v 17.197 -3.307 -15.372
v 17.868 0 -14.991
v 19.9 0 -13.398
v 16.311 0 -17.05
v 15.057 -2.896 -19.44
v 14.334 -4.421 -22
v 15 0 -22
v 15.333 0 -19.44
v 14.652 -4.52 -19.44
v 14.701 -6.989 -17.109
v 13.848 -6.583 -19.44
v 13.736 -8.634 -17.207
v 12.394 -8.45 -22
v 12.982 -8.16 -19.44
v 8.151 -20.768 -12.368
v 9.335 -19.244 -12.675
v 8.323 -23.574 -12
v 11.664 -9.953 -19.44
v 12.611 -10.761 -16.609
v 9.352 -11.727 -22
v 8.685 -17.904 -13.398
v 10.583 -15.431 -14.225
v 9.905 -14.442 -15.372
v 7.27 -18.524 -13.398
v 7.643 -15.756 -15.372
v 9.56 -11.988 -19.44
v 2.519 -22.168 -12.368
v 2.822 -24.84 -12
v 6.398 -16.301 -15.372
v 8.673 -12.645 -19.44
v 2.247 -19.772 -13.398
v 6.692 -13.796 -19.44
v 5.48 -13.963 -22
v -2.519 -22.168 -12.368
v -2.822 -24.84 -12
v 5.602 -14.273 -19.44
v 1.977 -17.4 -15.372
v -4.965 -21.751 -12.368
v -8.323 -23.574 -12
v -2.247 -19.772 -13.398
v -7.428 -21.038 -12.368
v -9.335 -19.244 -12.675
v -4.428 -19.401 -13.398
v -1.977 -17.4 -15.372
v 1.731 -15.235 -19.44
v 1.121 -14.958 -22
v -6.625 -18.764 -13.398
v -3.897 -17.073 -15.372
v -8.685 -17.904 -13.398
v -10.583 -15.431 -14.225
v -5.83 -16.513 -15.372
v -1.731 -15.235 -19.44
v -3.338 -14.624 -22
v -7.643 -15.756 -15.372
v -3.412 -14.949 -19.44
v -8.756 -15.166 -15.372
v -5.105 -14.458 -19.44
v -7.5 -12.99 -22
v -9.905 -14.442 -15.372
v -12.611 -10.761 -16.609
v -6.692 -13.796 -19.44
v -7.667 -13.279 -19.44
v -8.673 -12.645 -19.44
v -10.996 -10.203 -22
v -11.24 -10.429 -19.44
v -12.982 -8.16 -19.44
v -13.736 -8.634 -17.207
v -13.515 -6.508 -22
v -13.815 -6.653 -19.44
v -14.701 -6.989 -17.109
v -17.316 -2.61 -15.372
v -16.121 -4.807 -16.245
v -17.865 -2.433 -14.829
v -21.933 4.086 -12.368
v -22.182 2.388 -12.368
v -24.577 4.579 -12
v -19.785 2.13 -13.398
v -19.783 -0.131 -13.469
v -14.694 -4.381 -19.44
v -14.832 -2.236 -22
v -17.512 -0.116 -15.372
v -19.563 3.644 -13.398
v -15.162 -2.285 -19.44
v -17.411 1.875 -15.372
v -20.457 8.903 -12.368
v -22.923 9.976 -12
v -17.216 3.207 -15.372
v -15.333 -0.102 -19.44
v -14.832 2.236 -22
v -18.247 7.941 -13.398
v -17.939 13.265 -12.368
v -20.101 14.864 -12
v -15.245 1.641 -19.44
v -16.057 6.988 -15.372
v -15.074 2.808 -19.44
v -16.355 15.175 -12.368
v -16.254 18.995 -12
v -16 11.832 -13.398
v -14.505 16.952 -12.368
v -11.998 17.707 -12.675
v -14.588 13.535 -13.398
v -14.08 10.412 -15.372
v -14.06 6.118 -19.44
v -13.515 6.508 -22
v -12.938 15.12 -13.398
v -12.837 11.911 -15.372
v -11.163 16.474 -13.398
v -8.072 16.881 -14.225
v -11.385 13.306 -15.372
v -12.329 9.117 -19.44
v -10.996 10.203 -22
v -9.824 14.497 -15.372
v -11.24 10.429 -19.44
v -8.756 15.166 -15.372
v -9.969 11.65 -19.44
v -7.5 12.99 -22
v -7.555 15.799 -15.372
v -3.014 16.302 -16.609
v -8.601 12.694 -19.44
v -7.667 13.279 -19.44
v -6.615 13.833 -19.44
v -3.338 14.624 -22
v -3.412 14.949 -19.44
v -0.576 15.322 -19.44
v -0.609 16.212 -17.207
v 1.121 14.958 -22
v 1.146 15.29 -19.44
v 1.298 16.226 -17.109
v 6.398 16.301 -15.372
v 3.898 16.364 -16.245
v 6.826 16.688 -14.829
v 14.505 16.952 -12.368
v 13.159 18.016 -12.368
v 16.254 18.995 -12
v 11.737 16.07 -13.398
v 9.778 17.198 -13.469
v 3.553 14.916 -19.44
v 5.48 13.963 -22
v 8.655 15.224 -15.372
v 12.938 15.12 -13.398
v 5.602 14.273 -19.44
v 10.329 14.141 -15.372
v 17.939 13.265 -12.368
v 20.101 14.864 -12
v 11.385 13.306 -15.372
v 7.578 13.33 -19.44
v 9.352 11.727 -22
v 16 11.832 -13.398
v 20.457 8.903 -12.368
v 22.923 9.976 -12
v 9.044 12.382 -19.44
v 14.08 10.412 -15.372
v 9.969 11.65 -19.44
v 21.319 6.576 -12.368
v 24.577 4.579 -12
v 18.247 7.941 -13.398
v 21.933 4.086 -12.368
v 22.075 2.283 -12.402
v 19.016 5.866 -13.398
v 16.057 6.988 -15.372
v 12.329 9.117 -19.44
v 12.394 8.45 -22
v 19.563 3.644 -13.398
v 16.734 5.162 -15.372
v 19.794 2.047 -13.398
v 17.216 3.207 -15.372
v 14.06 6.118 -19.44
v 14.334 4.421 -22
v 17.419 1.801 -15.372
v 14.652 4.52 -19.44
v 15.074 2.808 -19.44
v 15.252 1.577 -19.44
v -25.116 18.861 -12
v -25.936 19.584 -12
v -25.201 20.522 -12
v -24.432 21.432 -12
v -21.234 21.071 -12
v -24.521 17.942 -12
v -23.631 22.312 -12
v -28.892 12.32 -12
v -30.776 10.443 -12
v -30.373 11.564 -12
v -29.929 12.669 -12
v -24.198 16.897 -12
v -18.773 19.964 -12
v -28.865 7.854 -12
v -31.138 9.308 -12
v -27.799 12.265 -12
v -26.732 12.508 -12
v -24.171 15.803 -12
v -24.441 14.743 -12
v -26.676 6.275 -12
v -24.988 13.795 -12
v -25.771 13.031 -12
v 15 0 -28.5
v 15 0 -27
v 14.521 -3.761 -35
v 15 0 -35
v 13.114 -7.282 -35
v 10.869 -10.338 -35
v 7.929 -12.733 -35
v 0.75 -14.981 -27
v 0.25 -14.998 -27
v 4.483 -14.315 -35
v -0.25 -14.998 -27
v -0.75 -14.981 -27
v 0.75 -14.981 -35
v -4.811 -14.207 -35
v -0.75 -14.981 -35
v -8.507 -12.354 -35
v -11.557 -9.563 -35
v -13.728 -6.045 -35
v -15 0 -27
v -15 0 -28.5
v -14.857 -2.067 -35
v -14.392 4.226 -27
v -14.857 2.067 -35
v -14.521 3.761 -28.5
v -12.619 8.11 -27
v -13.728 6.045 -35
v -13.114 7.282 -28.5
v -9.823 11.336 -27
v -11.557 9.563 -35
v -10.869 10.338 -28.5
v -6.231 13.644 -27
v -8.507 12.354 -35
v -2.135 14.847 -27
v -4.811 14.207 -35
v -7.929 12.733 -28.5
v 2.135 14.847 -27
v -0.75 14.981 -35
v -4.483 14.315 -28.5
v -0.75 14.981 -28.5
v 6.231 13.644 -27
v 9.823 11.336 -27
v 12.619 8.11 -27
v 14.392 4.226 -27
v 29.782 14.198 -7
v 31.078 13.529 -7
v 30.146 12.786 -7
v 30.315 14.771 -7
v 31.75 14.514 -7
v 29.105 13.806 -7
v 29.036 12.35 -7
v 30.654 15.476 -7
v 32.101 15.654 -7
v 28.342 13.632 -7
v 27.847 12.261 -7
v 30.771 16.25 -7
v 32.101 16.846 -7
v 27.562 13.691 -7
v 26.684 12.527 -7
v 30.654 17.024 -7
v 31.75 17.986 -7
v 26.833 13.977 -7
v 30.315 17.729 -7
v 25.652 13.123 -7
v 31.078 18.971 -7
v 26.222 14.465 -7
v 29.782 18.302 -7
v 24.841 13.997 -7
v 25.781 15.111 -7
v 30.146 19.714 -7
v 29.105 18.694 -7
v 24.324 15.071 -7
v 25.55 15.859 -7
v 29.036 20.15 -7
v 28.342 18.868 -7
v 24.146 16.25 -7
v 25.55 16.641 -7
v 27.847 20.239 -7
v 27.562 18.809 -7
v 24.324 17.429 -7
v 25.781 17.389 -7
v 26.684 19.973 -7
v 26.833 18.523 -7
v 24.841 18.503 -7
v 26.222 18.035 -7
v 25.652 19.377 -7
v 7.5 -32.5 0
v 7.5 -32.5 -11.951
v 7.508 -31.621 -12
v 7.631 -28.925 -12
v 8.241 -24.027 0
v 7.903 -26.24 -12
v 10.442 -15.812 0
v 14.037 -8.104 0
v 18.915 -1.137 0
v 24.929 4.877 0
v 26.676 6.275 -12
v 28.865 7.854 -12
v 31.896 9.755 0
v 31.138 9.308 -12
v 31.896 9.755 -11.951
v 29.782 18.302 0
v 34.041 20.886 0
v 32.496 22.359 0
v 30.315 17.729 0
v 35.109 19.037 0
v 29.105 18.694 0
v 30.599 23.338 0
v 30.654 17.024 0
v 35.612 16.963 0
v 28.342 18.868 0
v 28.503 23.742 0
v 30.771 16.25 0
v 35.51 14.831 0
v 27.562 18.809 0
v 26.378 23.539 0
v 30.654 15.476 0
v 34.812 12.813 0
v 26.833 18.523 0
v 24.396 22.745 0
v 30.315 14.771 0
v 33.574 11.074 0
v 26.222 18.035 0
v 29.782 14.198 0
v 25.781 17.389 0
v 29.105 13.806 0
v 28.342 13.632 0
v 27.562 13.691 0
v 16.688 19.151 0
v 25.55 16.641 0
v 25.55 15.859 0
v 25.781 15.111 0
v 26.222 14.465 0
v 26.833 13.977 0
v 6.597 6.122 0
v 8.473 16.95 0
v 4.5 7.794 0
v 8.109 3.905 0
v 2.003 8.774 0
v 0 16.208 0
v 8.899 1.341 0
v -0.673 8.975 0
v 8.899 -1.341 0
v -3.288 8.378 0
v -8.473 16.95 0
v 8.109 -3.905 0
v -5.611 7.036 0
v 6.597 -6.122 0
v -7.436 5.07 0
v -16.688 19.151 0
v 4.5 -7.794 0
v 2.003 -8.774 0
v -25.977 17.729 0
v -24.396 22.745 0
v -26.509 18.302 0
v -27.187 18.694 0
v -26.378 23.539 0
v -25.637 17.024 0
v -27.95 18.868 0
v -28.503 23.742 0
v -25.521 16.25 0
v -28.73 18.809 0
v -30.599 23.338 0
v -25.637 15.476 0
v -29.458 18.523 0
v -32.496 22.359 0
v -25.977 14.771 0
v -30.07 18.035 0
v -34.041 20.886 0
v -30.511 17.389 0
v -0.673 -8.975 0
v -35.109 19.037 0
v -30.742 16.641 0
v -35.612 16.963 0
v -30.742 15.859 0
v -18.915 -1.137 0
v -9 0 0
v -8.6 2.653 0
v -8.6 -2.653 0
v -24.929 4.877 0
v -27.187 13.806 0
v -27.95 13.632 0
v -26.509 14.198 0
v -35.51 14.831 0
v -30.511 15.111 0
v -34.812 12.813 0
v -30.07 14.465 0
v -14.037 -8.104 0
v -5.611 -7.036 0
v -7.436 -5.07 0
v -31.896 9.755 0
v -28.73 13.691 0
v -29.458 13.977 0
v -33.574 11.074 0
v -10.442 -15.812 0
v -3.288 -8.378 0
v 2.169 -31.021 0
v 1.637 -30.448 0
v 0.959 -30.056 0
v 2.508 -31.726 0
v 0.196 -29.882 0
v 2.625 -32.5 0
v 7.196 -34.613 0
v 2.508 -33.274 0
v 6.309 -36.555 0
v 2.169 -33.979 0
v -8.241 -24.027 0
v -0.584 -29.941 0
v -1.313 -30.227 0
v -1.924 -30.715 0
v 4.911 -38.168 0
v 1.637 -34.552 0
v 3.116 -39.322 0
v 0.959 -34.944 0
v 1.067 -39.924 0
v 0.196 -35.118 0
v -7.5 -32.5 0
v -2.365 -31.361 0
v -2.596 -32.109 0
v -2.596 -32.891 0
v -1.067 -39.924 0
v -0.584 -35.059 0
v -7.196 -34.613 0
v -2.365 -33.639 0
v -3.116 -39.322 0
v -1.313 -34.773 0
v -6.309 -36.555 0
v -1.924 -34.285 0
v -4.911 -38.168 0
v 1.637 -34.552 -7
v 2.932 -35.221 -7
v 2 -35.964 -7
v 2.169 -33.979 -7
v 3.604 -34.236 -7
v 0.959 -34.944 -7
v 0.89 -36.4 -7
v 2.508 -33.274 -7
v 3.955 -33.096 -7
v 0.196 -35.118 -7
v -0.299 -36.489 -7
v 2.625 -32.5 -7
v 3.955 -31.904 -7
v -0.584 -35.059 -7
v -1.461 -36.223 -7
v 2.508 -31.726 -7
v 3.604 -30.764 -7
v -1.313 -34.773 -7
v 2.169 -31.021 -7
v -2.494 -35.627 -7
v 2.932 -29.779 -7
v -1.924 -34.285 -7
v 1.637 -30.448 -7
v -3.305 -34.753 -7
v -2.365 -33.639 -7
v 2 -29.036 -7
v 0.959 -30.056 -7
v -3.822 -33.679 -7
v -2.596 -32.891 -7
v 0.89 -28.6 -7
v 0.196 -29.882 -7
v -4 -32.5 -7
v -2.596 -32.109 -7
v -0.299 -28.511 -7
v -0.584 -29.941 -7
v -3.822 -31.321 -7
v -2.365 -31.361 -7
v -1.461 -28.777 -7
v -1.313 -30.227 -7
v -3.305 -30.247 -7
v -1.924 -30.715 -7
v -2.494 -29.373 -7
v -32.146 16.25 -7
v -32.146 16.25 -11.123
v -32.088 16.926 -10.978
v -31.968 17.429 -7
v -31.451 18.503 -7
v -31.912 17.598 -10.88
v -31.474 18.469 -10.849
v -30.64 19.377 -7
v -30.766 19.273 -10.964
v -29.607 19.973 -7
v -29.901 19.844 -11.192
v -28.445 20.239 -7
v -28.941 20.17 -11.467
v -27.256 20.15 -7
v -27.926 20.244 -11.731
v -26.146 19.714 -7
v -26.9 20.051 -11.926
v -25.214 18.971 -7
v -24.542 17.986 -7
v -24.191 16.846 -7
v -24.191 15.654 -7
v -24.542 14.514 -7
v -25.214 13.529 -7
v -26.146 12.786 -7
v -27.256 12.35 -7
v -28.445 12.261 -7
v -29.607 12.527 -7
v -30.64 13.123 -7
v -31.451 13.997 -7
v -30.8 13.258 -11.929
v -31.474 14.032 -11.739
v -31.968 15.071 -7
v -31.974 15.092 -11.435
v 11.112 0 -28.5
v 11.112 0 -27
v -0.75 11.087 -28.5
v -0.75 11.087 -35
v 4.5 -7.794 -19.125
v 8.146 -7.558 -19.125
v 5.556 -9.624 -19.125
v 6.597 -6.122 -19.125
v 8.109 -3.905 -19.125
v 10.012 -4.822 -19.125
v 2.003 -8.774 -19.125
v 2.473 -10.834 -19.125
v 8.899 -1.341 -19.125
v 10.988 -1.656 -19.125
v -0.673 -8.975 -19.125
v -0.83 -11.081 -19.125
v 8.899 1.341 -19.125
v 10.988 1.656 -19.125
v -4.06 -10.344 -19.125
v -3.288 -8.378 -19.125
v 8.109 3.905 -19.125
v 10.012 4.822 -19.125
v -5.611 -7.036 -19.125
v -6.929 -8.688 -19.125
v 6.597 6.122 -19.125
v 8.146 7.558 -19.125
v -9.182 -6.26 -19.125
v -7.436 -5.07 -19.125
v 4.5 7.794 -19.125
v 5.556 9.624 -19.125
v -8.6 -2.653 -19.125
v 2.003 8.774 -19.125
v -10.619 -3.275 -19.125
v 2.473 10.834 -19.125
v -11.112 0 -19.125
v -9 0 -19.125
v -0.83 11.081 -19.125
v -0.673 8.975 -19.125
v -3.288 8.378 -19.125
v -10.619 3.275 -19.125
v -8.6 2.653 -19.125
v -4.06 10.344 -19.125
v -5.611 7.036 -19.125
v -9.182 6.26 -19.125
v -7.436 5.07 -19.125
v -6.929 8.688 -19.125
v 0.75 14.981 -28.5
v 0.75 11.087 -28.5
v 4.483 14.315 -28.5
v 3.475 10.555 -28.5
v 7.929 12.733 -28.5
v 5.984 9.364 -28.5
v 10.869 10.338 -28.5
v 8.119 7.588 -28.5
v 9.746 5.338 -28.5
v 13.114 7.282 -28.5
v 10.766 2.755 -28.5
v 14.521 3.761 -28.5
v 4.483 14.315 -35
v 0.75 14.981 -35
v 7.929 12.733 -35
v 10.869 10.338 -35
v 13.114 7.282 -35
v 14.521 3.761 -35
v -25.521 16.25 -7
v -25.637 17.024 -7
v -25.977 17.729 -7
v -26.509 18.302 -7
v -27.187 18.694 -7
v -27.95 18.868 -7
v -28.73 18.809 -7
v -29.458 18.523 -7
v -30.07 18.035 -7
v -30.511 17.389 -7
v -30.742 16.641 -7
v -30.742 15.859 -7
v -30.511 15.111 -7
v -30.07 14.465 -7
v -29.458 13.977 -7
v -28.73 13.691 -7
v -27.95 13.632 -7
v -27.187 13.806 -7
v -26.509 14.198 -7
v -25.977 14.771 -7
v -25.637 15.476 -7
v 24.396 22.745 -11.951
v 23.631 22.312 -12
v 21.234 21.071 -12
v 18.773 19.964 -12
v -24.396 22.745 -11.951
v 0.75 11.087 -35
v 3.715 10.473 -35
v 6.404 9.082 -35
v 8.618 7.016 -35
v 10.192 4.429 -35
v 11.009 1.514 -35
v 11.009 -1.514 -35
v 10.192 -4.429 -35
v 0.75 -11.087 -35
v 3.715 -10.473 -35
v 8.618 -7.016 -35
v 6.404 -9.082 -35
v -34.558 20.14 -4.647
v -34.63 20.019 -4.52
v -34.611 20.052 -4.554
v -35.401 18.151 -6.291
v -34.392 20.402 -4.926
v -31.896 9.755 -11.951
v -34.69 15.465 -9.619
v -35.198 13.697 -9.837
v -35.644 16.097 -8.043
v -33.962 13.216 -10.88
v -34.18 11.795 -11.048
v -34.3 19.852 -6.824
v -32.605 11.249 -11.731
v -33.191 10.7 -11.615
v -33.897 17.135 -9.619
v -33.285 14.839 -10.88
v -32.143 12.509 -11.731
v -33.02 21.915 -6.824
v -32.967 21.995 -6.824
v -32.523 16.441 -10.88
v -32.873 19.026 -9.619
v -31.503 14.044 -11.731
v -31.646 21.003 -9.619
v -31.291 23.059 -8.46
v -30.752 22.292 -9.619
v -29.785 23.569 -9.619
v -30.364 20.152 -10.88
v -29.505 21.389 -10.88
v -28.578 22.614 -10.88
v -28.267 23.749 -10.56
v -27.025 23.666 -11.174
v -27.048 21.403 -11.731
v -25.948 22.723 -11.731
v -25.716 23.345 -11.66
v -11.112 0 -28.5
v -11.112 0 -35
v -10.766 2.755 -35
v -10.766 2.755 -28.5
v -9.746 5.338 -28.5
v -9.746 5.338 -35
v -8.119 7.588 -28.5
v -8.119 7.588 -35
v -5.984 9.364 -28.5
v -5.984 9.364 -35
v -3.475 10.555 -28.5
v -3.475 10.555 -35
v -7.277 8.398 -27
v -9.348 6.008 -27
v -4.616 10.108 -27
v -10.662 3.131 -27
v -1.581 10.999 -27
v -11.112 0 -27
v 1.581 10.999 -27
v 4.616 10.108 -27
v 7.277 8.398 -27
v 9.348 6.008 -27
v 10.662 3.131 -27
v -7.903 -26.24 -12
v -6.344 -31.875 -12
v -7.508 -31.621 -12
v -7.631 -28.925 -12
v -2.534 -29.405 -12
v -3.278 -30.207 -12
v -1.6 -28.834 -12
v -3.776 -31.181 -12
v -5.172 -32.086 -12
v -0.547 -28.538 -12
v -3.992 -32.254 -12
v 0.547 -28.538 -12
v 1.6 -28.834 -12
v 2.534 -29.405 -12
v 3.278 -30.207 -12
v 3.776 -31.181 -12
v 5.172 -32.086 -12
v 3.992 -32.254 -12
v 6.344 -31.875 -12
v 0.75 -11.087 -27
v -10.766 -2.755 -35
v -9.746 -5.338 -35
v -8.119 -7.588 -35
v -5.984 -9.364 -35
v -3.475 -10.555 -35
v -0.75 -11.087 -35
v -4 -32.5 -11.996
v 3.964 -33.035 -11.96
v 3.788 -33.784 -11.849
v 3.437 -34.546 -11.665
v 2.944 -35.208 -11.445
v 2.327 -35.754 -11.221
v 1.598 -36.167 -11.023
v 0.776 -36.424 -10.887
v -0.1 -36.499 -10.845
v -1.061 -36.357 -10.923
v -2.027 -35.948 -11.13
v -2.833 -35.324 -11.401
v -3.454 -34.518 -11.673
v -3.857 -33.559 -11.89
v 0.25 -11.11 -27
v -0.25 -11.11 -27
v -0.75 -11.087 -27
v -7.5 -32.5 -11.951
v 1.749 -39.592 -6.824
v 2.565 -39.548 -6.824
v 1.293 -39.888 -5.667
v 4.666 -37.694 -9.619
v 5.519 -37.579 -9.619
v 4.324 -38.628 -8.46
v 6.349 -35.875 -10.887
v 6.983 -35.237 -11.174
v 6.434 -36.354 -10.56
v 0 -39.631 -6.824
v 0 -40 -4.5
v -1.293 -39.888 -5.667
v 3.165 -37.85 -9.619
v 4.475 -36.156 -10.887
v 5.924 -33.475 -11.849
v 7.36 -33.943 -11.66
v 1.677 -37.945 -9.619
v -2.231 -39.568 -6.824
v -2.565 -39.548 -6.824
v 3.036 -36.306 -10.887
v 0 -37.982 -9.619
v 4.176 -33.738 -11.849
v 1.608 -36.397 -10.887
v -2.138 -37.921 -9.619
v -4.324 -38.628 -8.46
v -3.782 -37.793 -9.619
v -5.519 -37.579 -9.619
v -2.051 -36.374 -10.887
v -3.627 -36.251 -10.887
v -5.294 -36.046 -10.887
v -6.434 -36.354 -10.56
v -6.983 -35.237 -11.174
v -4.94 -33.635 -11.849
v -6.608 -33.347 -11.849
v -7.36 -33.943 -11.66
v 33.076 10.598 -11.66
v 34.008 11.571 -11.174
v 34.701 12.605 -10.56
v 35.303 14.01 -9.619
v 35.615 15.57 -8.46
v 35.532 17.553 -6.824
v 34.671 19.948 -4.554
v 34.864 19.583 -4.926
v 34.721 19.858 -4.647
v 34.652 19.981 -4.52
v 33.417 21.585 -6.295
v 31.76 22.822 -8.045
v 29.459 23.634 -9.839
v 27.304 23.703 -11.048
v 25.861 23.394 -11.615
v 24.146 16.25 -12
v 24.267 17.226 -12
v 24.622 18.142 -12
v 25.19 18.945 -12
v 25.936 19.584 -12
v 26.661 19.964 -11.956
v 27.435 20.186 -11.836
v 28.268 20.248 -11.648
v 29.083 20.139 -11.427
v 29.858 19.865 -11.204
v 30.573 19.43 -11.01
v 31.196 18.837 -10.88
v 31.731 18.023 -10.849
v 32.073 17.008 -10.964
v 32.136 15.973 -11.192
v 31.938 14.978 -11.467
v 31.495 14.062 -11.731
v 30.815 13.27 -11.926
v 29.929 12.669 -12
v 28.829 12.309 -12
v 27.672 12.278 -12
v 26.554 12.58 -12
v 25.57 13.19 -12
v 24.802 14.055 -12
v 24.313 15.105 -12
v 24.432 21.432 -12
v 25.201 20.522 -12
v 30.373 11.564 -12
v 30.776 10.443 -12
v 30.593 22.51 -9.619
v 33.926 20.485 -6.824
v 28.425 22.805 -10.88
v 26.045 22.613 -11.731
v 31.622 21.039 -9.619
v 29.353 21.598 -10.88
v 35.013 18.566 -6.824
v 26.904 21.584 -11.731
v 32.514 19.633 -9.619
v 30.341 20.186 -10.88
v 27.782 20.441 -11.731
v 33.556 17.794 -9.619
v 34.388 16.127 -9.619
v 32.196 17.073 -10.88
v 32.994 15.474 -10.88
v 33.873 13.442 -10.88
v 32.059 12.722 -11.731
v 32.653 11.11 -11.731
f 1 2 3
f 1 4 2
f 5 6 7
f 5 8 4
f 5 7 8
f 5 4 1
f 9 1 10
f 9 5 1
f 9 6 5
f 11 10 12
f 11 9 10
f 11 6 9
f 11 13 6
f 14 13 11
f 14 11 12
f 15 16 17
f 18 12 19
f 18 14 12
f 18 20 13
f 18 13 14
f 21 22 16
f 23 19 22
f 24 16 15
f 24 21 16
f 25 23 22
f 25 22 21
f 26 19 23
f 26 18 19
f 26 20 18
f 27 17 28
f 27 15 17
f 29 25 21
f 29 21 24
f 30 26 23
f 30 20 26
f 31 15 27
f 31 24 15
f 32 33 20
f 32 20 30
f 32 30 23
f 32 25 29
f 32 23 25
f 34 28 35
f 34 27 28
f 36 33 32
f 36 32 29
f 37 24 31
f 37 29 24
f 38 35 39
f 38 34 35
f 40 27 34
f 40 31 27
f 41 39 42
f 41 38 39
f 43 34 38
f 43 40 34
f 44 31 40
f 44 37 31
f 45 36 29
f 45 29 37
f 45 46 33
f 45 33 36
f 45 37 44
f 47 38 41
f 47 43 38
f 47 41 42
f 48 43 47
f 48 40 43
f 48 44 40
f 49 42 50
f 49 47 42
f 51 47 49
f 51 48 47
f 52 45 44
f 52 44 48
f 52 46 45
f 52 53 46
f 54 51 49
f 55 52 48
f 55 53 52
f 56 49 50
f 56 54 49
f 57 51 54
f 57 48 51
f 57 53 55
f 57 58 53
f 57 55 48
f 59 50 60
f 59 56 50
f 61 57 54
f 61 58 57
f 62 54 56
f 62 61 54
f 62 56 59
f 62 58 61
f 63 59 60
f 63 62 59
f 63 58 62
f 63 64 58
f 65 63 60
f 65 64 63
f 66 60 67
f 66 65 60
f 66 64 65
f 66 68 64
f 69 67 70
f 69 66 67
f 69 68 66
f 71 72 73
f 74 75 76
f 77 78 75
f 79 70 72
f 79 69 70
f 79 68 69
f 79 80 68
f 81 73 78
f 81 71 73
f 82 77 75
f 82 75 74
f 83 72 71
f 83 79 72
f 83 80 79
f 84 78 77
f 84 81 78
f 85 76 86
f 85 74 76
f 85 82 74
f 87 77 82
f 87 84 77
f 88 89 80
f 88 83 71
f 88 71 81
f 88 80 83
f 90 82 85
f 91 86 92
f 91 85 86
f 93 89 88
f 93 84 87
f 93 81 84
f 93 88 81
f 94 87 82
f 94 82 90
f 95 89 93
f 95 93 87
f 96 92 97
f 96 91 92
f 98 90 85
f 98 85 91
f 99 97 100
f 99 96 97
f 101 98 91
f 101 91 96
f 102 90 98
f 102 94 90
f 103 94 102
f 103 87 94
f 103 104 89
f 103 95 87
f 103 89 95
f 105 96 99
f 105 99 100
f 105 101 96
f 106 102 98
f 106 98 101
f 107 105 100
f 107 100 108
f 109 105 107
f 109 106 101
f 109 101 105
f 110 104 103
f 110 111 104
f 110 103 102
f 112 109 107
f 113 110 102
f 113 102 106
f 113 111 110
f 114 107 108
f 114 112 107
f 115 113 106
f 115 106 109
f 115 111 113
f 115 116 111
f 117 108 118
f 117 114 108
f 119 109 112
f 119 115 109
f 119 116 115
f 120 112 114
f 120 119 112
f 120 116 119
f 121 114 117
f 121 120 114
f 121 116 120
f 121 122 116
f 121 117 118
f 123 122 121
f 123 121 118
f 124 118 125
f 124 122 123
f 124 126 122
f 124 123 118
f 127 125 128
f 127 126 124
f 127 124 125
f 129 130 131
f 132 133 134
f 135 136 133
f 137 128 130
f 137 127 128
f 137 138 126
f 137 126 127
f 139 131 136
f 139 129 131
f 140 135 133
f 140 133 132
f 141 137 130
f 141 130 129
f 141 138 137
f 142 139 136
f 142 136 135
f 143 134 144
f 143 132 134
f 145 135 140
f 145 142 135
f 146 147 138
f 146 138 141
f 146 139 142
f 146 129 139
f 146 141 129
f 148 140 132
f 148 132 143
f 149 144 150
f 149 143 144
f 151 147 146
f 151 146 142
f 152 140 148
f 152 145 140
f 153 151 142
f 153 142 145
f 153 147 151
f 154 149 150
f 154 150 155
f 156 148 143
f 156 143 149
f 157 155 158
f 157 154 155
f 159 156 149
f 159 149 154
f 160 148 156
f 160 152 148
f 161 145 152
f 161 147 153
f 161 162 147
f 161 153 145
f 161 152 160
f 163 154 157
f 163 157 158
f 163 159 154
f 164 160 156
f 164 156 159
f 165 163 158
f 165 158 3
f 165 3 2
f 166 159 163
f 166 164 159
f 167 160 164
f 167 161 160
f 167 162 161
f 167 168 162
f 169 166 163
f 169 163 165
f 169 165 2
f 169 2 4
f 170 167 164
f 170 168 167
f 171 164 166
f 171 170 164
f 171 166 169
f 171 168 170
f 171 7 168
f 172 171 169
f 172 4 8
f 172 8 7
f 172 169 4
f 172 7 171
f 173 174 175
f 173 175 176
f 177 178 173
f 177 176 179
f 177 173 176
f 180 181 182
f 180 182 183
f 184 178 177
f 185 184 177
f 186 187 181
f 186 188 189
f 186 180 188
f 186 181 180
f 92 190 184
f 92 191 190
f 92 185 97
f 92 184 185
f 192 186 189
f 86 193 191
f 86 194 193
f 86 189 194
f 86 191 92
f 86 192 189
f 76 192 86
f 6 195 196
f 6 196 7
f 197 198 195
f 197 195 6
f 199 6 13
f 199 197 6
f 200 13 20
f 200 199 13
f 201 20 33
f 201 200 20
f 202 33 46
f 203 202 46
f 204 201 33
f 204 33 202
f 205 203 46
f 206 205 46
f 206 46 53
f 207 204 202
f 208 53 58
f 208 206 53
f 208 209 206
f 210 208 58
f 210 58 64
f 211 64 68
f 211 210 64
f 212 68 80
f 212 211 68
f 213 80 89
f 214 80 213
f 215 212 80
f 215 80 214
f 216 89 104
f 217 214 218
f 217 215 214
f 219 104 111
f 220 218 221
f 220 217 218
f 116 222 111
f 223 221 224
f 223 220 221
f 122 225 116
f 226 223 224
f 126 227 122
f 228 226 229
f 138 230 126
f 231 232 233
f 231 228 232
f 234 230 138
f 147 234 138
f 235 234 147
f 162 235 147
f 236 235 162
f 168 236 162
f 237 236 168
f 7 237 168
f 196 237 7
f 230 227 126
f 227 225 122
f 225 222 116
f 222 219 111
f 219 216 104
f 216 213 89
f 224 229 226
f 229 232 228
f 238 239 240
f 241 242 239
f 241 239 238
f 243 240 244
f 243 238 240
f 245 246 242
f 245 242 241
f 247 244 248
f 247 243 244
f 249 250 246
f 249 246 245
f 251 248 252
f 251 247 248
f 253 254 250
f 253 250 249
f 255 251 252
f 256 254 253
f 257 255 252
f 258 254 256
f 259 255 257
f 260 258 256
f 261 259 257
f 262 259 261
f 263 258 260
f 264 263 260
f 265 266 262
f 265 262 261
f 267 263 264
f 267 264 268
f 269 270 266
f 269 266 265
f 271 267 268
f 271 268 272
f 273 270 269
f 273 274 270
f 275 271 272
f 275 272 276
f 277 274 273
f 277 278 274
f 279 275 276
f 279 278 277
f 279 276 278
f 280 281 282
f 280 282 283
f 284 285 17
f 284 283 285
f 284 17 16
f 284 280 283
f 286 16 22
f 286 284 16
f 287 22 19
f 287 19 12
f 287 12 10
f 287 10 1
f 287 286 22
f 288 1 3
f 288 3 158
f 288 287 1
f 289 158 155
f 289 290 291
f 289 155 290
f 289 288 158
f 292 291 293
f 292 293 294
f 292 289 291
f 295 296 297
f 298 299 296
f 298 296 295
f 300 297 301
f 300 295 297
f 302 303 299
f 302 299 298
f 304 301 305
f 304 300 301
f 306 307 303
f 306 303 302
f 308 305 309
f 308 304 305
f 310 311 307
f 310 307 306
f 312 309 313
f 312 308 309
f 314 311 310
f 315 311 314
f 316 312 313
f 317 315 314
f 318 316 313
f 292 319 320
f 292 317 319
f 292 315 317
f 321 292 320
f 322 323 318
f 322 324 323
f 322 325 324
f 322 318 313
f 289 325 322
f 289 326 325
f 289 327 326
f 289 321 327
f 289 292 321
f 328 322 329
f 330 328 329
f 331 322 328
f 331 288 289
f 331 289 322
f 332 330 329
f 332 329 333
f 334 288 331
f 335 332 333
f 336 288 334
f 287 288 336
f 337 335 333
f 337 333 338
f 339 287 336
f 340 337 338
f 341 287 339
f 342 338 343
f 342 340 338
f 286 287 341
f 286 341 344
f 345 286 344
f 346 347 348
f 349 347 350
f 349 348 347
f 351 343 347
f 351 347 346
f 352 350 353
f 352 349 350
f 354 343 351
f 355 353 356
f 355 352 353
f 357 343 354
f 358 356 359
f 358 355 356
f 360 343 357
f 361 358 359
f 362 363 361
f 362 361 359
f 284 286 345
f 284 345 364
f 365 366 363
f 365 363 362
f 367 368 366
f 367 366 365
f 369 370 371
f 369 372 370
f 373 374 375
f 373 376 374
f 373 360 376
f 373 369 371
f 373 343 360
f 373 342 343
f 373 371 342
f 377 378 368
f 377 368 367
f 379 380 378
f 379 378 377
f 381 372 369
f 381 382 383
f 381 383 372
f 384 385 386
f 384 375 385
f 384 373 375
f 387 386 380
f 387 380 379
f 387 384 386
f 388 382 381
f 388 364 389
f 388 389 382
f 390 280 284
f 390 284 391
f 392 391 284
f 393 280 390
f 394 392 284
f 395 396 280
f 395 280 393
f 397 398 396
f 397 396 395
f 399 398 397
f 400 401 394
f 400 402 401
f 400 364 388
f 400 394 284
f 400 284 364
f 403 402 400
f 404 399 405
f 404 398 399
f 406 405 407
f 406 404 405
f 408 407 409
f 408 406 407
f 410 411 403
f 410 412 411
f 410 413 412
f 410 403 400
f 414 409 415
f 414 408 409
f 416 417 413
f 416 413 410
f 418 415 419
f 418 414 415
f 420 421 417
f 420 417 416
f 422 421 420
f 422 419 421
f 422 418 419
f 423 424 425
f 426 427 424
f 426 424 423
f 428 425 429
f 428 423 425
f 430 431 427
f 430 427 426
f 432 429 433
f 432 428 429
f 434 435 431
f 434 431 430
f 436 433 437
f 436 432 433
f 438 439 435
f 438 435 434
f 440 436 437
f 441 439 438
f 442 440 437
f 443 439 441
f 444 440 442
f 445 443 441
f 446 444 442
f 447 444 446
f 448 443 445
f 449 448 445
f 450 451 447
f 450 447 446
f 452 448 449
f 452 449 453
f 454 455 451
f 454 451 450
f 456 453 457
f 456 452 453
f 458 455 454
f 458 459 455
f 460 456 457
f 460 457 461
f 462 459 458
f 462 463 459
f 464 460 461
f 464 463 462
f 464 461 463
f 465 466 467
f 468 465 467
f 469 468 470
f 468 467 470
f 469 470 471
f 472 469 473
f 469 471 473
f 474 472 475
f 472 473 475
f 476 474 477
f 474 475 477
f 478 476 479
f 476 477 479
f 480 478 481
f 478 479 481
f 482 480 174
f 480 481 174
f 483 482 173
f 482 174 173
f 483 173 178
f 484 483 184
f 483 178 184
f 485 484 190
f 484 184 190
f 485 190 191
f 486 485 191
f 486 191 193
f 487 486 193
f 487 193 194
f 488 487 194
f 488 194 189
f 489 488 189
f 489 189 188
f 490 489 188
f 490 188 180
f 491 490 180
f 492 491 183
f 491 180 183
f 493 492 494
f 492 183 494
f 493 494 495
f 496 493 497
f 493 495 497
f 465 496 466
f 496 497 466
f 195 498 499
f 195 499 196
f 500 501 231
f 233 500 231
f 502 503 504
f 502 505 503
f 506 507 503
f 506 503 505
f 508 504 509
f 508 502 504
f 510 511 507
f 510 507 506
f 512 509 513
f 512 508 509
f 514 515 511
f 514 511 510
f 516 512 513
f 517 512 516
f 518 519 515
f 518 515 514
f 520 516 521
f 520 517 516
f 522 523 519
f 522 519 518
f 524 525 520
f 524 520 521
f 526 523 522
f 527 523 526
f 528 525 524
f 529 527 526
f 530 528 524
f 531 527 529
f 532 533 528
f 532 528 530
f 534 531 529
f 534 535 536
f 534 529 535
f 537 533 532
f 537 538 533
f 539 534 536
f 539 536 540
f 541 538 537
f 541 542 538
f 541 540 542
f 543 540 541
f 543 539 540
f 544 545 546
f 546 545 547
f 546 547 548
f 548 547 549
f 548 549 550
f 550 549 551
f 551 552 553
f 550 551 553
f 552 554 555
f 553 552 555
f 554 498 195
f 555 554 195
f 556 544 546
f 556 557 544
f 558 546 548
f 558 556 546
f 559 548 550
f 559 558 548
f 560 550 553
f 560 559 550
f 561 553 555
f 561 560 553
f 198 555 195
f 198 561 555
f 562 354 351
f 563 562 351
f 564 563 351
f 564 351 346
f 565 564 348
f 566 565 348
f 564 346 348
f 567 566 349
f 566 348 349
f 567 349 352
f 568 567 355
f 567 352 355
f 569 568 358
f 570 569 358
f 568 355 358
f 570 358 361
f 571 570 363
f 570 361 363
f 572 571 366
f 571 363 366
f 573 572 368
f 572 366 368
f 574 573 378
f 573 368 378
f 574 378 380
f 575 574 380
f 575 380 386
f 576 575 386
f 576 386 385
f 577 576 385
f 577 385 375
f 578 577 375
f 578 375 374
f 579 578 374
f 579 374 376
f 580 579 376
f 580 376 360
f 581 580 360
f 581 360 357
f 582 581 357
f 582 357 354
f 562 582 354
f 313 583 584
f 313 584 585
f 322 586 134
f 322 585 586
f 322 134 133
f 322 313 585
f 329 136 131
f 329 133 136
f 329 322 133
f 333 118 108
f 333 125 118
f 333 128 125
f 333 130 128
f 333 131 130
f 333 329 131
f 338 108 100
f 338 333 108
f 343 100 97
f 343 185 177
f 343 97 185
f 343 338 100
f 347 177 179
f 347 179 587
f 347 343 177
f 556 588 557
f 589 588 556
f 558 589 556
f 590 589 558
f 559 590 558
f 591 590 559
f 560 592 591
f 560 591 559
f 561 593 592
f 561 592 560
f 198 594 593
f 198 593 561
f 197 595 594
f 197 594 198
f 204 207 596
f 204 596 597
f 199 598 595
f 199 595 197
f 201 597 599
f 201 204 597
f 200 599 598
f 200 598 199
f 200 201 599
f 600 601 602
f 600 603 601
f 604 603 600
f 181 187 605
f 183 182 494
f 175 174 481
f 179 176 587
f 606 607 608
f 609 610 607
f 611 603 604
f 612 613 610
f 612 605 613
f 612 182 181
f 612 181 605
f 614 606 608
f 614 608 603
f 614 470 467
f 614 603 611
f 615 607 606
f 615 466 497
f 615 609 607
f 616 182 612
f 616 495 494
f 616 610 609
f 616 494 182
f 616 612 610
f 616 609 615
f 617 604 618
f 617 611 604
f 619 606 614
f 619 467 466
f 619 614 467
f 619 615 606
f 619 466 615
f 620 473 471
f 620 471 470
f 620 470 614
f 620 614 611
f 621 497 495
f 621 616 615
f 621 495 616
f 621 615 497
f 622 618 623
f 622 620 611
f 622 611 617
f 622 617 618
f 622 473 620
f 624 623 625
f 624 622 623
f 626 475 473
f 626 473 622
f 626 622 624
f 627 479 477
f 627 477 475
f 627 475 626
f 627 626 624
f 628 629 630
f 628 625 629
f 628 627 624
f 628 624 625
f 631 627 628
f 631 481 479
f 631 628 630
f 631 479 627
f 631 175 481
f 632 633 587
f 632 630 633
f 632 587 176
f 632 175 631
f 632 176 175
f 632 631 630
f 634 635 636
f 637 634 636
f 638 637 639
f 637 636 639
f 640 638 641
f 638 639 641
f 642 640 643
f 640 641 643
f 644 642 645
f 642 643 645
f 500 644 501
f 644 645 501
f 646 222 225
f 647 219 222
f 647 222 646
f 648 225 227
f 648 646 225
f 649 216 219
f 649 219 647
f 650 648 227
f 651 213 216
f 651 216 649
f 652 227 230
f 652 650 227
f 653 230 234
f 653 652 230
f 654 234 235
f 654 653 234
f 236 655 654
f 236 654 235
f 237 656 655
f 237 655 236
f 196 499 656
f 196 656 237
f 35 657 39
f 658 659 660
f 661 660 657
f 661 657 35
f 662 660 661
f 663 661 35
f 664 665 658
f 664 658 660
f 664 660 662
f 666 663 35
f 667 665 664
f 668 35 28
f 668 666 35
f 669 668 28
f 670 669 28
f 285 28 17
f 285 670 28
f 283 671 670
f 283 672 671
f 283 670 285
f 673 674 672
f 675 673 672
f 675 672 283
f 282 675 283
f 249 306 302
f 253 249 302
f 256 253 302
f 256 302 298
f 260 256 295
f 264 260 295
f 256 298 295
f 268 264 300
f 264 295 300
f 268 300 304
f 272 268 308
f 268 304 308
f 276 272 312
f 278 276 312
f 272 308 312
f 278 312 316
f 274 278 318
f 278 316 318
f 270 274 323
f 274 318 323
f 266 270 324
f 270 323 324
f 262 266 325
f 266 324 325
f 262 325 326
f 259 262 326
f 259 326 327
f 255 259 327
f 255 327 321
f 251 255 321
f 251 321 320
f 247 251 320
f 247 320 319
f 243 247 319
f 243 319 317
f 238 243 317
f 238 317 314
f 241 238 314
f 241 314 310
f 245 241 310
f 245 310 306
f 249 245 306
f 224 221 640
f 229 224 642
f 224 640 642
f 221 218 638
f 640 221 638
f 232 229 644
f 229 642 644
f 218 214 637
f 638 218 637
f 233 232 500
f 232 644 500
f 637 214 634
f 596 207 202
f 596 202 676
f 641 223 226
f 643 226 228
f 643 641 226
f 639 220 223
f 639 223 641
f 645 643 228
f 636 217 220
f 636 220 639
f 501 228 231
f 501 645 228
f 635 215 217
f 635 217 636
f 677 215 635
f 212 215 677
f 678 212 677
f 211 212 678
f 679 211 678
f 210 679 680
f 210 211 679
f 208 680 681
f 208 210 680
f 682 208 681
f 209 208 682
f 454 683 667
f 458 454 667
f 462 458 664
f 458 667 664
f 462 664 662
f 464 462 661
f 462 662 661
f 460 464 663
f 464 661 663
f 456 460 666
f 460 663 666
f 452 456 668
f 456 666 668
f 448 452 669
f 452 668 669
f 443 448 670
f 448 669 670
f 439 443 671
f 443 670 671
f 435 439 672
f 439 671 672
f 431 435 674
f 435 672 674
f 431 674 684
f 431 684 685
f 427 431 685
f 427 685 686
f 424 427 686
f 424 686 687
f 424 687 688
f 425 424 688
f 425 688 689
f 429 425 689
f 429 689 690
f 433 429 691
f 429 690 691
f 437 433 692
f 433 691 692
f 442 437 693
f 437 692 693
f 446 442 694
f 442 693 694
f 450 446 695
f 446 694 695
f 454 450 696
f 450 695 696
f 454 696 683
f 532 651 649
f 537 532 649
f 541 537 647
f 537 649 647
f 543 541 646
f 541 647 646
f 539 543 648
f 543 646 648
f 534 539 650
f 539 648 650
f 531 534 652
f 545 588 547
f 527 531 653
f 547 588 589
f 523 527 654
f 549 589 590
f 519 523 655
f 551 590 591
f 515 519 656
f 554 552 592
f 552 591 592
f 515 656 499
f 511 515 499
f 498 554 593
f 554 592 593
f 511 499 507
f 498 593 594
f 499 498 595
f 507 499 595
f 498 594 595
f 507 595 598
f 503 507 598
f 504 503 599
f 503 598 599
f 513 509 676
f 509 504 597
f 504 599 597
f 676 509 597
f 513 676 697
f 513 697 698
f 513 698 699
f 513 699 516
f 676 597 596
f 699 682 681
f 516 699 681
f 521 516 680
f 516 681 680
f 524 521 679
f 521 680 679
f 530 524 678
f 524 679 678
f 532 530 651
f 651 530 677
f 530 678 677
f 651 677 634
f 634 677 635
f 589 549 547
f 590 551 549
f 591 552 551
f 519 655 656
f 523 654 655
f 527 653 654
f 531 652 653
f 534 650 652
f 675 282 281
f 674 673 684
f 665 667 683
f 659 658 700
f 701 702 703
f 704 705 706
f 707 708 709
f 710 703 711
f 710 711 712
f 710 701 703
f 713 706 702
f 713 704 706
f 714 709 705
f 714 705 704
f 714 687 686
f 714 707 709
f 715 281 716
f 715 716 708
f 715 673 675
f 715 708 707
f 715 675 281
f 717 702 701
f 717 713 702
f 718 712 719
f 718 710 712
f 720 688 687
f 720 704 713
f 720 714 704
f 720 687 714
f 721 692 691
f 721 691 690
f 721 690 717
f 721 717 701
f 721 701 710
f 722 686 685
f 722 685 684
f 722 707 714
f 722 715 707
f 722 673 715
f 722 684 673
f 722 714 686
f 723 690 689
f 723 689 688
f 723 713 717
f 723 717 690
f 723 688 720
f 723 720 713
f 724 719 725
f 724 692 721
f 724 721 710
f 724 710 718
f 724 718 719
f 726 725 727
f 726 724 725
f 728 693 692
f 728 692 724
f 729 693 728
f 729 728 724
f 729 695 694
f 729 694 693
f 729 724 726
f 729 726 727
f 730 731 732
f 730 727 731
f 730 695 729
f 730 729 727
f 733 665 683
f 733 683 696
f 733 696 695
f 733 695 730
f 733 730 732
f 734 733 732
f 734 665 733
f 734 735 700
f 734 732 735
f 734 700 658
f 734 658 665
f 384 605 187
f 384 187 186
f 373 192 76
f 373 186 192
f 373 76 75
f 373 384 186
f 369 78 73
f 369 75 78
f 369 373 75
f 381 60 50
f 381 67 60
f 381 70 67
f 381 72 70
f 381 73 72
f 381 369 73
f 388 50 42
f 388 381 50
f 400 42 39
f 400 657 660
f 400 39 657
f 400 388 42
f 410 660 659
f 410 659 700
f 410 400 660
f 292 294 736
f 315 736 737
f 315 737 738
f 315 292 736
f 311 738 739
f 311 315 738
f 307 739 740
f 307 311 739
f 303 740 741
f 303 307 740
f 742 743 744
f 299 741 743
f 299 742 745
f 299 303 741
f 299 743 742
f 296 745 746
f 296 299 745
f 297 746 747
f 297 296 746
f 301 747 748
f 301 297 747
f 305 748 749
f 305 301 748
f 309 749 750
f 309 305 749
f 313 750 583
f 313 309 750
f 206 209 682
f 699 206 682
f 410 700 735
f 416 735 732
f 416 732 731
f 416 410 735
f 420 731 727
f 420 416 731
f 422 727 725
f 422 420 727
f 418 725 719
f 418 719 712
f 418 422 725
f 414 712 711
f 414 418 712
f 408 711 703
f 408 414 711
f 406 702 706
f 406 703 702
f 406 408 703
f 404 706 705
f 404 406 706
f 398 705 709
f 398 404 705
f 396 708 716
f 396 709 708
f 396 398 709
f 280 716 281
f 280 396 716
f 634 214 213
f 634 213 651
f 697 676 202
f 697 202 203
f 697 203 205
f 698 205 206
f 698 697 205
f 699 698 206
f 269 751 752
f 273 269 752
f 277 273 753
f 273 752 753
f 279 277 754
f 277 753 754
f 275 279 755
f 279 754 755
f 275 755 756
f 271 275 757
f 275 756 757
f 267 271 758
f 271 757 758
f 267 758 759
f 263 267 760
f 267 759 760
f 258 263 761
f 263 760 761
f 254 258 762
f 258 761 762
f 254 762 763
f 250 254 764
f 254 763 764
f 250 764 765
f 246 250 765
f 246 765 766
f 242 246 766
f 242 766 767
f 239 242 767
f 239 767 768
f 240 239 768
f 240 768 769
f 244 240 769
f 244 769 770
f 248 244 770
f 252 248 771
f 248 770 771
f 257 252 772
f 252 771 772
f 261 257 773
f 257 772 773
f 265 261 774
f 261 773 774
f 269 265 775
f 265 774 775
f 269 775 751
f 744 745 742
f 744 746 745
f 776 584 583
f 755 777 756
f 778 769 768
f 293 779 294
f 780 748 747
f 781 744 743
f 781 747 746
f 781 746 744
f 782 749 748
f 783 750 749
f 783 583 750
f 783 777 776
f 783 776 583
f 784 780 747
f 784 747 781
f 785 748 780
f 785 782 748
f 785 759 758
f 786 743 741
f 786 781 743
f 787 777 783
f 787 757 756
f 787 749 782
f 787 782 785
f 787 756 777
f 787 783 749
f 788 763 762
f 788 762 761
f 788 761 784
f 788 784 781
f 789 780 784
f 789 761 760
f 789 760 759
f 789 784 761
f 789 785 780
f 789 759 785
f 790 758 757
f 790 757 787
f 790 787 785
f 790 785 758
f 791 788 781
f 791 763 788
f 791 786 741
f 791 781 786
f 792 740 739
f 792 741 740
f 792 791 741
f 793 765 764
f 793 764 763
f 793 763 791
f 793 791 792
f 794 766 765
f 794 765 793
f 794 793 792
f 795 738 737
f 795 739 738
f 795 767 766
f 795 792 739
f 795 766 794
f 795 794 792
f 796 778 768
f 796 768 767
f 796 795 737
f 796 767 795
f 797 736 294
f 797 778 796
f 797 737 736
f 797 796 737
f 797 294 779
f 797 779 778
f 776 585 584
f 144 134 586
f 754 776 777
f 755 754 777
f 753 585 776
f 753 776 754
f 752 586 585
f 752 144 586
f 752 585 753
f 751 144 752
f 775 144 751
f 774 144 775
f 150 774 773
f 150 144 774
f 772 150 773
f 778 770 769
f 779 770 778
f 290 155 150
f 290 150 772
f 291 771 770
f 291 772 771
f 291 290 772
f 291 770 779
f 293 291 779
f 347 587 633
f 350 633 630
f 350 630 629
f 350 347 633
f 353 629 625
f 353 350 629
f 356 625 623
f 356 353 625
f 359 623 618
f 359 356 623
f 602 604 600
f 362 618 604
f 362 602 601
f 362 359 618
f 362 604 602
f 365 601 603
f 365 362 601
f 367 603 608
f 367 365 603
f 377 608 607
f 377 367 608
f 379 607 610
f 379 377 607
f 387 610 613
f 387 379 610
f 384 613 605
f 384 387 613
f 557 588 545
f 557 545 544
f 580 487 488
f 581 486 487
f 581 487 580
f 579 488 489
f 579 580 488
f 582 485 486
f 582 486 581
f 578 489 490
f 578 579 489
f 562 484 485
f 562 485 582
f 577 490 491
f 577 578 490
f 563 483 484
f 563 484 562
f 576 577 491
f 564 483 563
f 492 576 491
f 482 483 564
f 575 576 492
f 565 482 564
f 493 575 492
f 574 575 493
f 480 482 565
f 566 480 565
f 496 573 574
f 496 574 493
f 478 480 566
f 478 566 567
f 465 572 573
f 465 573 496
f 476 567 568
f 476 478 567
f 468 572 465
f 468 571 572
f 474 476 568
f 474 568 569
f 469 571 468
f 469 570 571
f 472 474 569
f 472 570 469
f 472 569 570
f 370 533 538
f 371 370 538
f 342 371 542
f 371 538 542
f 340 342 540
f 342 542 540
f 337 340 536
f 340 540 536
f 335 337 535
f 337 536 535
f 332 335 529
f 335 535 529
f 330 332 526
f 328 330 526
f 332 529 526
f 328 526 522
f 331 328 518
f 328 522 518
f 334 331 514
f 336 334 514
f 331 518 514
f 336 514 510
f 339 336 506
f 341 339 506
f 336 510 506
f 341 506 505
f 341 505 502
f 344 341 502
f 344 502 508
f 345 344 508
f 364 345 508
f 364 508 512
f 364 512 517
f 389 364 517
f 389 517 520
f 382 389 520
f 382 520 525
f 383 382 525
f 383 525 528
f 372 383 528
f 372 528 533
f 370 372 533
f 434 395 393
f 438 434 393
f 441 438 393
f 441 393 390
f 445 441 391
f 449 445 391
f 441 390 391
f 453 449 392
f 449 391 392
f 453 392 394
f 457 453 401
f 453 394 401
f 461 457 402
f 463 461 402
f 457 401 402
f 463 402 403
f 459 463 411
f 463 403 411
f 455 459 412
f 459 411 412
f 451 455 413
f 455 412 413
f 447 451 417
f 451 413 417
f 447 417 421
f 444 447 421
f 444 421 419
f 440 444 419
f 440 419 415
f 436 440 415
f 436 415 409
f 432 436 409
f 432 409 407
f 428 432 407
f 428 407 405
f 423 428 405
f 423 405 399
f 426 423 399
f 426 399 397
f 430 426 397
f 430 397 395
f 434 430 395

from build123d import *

# Parameters (mm, degrees)
SKETCH2_R          = 11.1125
CUT_EXTRUDE1_DEPTH = 15.875
SKETCH3_W          = 35
SKETCH3_H          = 1.5
CUT_EXTRUDE2_DEPTH = 15.875
SKETCH4_W          = 1.5
SKETCH4_H          = 35
CUT_EXTRUDE3_DEPTH = 8
SKETCH8_OUTSIDE_W  = 105.686
SKETCH8_OUTSIDE_H  = 105.686
CUT_EXTRUDE4_DEPTH = 36
SKETCH9_R          = 9
CUT_EXTRUDE5_DEPTH = 20.1250001
SKETCH5_R          = 2.625
CUT_EXTRUDE7_DEPTH = 36
SKETCH11_R         = 4
CUT_EXTRUDE8_DEPTH = 5


with BuildPart() as part:
    # Sketch1 → Revolve1 (revolve)
    with BuildSketch(Plane(origin=(0, 0, 0), x_dir=(1, 0, 0), z_dir=(0, 1, 0))):
        with BuildLine():
            Line((0, 0), (40, 0))
            Line((40, 0), (40, 4.5))
            ThreePointArc((40, 4.5), (37.803300859, 9.803300859), (32.5, 12))
            Line((32.5, 12), (25, 12))
            ThreePointArc((25, 12), (17.928932188, 14.928932188), (15, 22))
            Line((15, 22), (15, 35))
            Line((15, 35), (0, 35))
            Line((0, 35), (0, 0))
        make_face()
    revolve(axis=Axis((0, 0, 0), (0, 0, -1)))

    # Sketch2 → Cut-Extrude1 (cut)
    with BuildSketch(Plane(origin=(0, 0, -35), x_dir=(-1, 0, 0), z_dir=(0, 0, -1))):
        Circle(SKETCH2_R)
    extrude(amount=-CUT_EXTRUDE1_DEPTH, mode=Mode.SUBTRACT)

    # Sketch3 → Cut-Extrude2 (cut)
    with BuildSketch(Plane(origin=(0, 0, 0), x_dir=(1, 0, 0), z_dir=(0, 1, 0))):
        with Locations((0, 27.75)):
            Rectangle(SKETCH3_W, SKETCH3_H)
    extrude(amount=CUT_EXTRUDE2_DEPTH, mode=Mode.SUBTRACT)

    # Sketch4 → Cut-Extrude3 (cut)
    with BuildSketch(Plane(origin=(0, 0, -35), x_dir=(-1, 0, 0), z_dir=(0, 0, -1))):
        Rectangle(SKETCH4_W, SKETCH4_H)
    extrude(amount=-CUT_EXTRUDE3_DEPTH, mode=Mode.SUBTRACT)

    # Sketch8 outside → Cut-Extrude4 (cut, through all)
    with BuildSketch(Plane.XY):
        Rectangle(SKETCH8_OUTSIDE_W, SKETCH8_OUTSIDE_H)
        with BuildLine():
            ThreePointArc((-24.395825623, 22.745190528), (-34.641016151, 20), (-31.895825623, 9.754809472))
            ThreePointArc((-31.895825623, 9.754809472), (-14.036841774, -8.104174377), (-7.5, -32.5))
            ThreePointArc((-7.5, -32.5), (0, -40), (7.5, -32.5))
            ThreePointArc((7.5, -32.5), (14.036841774, -8.104174377), (31.895825623, 9.754809472))
            ThreePointArc((31.895825623, 9.754809472), (34.641016151, 20), (24.395825623, 22.745190528))
            ThreePointArc((24.395825623, 22.745190528), (0, 16.208348754), (-24.395825623, 22.745190528))
        make_face(mode=Mode.SUBTRACT)
    extrude(amount=-CUT_EXTRUDE4_DEPTH, mode=Mode.SUBTRACT)

    # Sketch9 → Cut-Extrude5 (cut, through all)
    with BuildSketch(Plane(origin=(0, 0, -19.125), x_dir=(-1, 0, 0), z_dir=(0, 0, -1))):
        Circle(SKETCH9_R)
    extrude(amount=-CUT_EXTRUDE5_DEPTH, mode=Mode.SUBTRACT)

    # Sketch5 → Cut-Extrude7 (cut, through all)
    with BuildSketch(Plane.XY):
        with Locations((-28.145825623, 16.25)):
            Circle(SKETCH5_R)
        with Locations((28.145825623, 16.25)):
            Circle(SKETCH5_R)
        with Locations((0, -32.5)):
            Circle(SKETCH5_R)
    extrude(amount=-CUT_EXTRUDE7_DEPTH, mode=Mode.SUBTRACT)

    # Sketch11 → Cut-Extrude8 (cut)
    with BuildSketch(Plane(origin=(0, 0, -12), x_dir=(-1, 0, 0), z_dir=(0, 0, -1))):
        with Locations((-28.145825623, 16.25)):
            Circle(SKETCH11_R)
        with Locations((28.145825623, 16.25)):
            Circle(SKETCH11_R)
        with Locations((0, -32.5)):
            Circle(SKETCH11_R)
    extrude(amount=-CUT_EXTRUDE8_DEPTH, mode=Mode.SUBTRACT)


solid = part.part
